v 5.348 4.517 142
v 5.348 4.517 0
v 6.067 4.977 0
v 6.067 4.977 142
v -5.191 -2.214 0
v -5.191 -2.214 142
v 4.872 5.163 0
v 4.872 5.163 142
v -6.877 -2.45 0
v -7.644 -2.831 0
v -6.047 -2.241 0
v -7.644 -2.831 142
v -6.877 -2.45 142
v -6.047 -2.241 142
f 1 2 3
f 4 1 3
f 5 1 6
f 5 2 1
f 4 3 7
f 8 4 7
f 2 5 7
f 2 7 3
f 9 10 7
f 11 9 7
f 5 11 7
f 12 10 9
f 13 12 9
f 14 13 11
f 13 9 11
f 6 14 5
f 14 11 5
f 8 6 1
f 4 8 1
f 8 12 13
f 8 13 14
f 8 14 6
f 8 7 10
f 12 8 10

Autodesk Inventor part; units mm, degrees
ref_plane "YZ Plane" through (0, 0, 0) normal (1, 0, 0) x (0, 1, 0)
ref_plane "XZ Plane" through (0, 0, 0) normal (0, 1, 0) x (-1, 0, 0)
ref_plane "XY Plane" through (0, 0, 0) normal (0, 0, 1) x (1, 0, 0)
sketch "Sketch2" plane through (0, 0, 0) normal (0, 0, 1) x (1, 0, 0)
  line L0 (4.8719, 5.1626) -> (-7.644, -2.8311)
  line L1 (5.3481, 4.5174) -> (-5.1907, -2.2135)
  line L2 (5.3481, 4.5174) -> (6.0672, 4.9767)
  arc A0 (-5.1907, -2.2135) -> (-7.644, -2.8311) centre (-5.4909, -6.2022) ccw
  line L3 (6.0672, 4.9767) -> (4.8719, 5.1626)
  point P0 (5.2456, 5.1046)
  dimension "d8" = 0.8
  dimension "d9" = 8
extrude "Extrusion2" add sketch "Sketch2" along normal blind 142
properties part number "2P.03.01.06.IM.AileronCutFill" material "Wood (Birch)"
